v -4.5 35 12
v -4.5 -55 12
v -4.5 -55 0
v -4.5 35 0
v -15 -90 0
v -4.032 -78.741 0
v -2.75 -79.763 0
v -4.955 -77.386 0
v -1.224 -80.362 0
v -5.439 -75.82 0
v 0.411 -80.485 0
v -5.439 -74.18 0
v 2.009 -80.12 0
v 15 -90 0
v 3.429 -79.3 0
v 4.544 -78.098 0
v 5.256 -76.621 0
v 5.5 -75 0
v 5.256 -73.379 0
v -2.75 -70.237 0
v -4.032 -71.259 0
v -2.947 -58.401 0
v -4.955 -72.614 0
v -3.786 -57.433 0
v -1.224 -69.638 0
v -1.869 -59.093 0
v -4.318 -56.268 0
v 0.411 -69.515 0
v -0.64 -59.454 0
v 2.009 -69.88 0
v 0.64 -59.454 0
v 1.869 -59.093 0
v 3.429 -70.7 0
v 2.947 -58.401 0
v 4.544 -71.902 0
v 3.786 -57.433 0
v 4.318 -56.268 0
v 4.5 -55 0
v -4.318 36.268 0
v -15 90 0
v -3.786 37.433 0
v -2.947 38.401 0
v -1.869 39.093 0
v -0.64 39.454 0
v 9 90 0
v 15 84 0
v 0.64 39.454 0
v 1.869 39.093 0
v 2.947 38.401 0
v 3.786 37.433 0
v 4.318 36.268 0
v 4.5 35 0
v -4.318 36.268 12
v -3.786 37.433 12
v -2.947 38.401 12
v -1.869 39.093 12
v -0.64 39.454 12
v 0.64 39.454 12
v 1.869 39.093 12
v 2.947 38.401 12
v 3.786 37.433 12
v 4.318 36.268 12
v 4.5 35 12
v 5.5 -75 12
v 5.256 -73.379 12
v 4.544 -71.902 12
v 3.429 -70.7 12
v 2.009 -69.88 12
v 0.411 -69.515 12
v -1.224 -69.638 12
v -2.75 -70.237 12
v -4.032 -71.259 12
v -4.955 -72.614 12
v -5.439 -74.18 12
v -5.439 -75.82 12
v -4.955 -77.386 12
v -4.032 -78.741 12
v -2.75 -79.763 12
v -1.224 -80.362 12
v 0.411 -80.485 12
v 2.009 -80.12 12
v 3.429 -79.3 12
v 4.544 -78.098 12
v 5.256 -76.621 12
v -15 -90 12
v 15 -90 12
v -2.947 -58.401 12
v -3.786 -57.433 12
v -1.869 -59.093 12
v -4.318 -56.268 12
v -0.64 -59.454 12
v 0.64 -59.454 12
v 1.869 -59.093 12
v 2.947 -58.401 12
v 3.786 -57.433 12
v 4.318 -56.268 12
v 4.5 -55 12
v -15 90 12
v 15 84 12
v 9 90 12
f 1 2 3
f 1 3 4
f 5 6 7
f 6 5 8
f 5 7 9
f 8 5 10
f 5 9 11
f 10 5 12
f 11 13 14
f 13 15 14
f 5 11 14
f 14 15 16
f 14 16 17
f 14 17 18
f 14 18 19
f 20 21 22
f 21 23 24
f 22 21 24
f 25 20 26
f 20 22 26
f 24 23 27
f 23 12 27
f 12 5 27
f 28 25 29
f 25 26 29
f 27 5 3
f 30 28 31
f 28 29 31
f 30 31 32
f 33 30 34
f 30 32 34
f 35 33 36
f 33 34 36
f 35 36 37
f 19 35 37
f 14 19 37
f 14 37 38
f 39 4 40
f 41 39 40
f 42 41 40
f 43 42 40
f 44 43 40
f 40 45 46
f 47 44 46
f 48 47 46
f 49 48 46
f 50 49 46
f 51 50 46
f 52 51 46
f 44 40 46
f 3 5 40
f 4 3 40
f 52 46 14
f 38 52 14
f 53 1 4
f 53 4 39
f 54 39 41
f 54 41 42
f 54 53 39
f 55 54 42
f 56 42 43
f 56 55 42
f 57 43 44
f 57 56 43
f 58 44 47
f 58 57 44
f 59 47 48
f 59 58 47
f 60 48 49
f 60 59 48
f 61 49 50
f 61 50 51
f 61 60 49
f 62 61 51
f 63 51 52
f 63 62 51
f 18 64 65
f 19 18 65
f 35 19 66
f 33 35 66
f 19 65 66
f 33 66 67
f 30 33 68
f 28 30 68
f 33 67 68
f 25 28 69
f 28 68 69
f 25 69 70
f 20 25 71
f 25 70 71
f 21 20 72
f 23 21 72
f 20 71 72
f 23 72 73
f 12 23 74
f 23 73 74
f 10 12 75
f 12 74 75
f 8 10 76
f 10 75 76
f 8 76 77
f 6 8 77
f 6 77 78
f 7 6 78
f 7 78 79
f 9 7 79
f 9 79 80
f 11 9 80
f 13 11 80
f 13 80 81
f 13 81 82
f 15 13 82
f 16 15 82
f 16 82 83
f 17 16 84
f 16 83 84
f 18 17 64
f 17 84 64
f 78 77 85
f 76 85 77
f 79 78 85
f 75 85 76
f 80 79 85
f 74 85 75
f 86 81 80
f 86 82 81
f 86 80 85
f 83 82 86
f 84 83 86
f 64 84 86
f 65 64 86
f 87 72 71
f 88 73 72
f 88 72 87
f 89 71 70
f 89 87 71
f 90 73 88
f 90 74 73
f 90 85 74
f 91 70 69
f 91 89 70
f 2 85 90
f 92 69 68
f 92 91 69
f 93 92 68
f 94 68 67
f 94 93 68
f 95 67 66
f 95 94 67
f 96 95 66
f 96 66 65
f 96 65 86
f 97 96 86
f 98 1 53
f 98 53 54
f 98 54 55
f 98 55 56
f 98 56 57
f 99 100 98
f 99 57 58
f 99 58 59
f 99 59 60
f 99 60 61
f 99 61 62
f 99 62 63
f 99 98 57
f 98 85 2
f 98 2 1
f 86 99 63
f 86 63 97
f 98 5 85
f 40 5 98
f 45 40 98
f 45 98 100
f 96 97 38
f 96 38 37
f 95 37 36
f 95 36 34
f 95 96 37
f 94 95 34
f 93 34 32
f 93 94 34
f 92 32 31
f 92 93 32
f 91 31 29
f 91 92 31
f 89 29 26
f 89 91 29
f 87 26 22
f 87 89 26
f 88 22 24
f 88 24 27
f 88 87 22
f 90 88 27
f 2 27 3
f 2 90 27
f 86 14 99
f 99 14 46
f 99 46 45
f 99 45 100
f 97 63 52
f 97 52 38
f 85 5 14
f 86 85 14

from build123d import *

# Parameters (mm, degrees)
SKETCH_1_W          = 30
SKETCH_1_H          = 180
EXTRUDE_1_DEPTH     = 12
SKETCH_2_R          = 5.5
CUT_EXTRUDE_1_DEPTH = 12
CHAMFER_1_SIZE      = 6


with BuildPart() as part:
    # 草图1 → 凸台-拉伸1 (new body)
    with BuildSketch(Plane.XY):
        Rectangle(SKETCH_1_W, SKETCH_1_H)
    extrude(amount=EXTRUDE_1_DEPTH)

    # 草图2 → 切除-拉伸1 (cut)
    with BuildSketch(Plane.XY.offset(12)):
        with Locations((0, -75)):
            Circle(SKETCH_2_R)
        with BuildLine():
            Line((4.5, 35), (4.5, -55))
            ThreePointArc((4.5, -55), (0, -59.5), (-4.5, -55))
            Line((-4.5, -55), (-4.5, 35))
            ThreePointArc((-4.5, 35), (0, 39.5), (4.5, 35))
        make_face()
    extrude(amount=-CUT_EXTRUDE_1_DEPTH, mode=Mode.SUBTRACT)

    # 倒角1
    chamfer_1_edges = [part.edges().sort_by_distance(p)[0] for p in [
        (15, 90, 6),
    ]]
    chamfer(chamfer_1_edges, length=CHAMFER_1_SIZE)


solid = part.part
